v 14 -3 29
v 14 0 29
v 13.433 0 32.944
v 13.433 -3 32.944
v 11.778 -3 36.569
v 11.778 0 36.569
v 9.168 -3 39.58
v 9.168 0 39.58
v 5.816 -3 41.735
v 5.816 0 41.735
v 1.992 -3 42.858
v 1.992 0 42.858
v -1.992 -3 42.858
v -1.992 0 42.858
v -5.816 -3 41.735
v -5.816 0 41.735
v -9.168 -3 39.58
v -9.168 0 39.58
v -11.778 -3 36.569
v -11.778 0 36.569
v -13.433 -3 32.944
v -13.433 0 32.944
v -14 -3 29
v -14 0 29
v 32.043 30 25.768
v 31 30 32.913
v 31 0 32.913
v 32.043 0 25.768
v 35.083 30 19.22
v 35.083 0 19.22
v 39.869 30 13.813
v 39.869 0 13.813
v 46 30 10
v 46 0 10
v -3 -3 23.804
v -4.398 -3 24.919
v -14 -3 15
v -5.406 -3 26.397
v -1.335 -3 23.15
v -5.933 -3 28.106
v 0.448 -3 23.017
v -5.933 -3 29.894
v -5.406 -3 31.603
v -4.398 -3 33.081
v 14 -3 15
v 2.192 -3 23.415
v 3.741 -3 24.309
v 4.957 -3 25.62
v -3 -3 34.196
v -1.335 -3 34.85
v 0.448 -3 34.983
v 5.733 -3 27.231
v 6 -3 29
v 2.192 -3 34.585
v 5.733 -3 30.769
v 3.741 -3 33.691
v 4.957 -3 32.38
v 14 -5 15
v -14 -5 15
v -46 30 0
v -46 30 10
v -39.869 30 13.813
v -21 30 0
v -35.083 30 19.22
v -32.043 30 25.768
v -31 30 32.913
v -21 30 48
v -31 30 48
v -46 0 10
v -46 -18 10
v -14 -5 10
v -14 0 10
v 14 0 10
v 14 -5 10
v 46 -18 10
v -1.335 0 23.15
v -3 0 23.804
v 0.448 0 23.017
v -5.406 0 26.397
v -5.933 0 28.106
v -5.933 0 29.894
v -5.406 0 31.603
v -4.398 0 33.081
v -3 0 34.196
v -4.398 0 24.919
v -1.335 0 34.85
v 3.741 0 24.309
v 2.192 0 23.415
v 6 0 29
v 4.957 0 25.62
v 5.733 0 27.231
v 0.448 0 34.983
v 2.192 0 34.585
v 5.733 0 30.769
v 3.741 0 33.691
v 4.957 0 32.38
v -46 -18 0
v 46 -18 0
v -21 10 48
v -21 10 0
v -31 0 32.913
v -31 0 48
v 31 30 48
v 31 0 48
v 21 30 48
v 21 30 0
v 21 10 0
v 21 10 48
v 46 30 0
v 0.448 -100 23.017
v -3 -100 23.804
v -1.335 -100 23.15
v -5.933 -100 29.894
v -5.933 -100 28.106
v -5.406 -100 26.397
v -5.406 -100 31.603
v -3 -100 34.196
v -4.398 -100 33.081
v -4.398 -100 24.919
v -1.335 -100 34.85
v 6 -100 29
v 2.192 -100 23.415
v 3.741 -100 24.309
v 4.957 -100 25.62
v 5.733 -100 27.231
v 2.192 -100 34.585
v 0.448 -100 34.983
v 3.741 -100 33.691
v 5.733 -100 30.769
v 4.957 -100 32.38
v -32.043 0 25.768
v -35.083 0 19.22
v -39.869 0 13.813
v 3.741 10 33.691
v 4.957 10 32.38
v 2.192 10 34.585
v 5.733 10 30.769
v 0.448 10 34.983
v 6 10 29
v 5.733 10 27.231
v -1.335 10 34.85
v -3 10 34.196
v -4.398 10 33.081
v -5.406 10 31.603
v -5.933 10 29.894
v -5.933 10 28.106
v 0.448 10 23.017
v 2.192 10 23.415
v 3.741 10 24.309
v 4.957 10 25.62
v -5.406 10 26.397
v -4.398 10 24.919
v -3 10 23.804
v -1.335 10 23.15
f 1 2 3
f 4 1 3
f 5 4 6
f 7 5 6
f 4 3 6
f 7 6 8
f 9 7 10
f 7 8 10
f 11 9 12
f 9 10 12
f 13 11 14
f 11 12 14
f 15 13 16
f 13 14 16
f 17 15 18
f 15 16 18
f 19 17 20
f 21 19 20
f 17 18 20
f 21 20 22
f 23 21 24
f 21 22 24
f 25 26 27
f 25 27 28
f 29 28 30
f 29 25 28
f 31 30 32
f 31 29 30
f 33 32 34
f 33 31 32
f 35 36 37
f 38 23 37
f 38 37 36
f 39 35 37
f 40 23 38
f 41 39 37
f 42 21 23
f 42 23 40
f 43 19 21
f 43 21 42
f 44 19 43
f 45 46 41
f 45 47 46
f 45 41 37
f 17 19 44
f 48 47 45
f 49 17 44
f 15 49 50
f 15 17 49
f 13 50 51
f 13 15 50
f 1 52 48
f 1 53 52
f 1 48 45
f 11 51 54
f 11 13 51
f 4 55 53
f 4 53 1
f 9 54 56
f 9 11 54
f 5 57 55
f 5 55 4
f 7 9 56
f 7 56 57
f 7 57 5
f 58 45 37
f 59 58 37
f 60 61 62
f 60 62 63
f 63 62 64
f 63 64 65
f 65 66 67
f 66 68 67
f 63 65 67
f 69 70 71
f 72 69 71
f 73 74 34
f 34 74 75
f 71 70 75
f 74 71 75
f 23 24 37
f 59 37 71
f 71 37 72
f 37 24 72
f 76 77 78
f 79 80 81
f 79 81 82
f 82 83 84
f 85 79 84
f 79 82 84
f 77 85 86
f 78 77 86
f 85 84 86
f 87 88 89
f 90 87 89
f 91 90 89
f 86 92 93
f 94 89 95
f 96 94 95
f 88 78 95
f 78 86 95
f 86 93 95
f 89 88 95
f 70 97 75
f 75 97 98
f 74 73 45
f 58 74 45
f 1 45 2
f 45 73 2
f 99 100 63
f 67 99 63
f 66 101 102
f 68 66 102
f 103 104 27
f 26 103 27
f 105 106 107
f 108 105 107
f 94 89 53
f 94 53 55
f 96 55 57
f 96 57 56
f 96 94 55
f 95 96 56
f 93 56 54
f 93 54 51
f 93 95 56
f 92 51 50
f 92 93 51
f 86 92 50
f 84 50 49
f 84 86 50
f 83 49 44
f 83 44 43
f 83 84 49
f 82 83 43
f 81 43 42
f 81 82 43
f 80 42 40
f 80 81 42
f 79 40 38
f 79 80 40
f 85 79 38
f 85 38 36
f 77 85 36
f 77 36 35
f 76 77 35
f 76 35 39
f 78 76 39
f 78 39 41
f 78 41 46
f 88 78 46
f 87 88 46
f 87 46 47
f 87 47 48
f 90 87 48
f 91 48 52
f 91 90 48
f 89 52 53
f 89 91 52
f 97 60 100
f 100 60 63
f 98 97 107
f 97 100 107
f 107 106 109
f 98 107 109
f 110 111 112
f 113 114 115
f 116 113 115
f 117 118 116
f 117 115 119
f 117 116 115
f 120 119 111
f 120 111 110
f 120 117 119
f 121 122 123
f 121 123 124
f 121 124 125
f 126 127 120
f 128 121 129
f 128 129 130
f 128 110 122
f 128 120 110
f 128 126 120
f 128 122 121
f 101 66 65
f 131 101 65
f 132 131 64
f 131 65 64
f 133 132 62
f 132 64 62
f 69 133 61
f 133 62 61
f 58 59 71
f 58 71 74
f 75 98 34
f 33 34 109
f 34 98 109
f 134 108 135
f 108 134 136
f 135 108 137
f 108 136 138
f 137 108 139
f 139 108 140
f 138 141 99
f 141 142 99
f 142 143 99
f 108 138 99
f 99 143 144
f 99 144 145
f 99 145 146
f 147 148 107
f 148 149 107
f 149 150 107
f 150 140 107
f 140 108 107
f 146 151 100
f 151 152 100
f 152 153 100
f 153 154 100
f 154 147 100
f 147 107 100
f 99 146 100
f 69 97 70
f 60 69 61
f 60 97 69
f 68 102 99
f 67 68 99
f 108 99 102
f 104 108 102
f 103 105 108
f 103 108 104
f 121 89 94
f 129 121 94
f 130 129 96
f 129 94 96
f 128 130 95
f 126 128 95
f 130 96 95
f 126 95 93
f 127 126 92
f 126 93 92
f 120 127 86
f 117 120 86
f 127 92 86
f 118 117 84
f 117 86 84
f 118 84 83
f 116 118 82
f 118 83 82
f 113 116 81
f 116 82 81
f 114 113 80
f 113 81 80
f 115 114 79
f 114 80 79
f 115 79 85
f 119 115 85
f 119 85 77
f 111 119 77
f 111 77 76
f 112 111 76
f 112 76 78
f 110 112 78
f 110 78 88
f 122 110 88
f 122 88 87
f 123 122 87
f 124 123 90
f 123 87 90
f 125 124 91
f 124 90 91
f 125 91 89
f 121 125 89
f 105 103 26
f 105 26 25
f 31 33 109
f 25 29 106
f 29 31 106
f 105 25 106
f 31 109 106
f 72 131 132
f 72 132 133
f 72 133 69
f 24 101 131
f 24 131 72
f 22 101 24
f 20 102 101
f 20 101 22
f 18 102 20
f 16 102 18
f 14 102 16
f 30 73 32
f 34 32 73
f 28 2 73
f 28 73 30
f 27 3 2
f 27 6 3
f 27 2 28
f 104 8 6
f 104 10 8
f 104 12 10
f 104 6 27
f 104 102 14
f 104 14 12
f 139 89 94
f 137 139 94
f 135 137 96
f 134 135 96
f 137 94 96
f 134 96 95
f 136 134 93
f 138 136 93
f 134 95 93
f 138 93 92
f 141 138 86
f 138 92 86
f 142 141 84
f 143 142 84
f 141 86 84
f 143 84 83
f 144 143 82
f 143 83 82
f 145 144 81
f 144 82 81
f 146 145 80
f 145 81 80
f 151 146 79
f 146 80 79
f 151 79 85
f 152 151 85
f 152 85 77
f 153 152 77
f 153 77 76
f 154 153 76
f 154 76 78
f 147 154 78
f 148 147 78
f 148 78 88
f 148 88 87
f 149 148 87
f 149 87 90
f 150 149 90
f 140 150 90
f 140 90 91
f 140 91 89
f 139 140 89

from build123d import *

# Parameters (mm, degrees)
F1_DEPTH    = 48
F0_W        = 92
F0_H        = 18
F2_DEPTH    = 10
F3_W        = 15
F3_H        = 38
F4_DEPTH    = 50
F5_T1_DEPTH = 30
F6_R        = 6
F7_DEPTH    = 3
F8_DEPTH    = 5
F9_DEPTH    = 25
F10_DEPTH   = 100


# Not quite as in the source:
# - a fillet or chamfer that OpenCascade refuses, or shapes differently, is made with other operations: its cross-section is extruded or revolved along the edge and cut away or added


with BuildPart() as f1:
    # F0 (on Top) → F1 (new body)
    with BuildSketch(Plane.XY):
        Polygon((-46, 30), (-46, 0), (46, 0), (46, 30), (21, 30), (21, 10), (-21, 10), (-21, 30), align=None)
    extrude(amount=F1_DEPTH)

    # F0 (on Top) → F2 (join)
    with BuildSketch(Plane.XY):
        with Locations((0, -9)):
            Rectangle(F0_W, F0_H)
    extrude(amount=F2_DEPTH)

    # F3 (on face) → F4 (cut)
    with BuildSketch(Plane.XZ):
        Polygon((-31, 48), (-31, 58.456501329), (-68.4553310275, 62.7410188317), (-62.9399716854, 10), (-46, 10), (-46, 48), align=None)
        with Locations((-38.5, 29)):
            Rectangle(F3_W, F3_H)
        with Locations((38.5, 29)):
            Rectangle(F3_W, F3_H)
        Polygon((31, 58.8478222489), (31, 48), (46, 48), (46, 10), (62.6155510545, 10), (62.6155510545, 62.4165832996), align=None)
    extrude(amount=-F4_DEPTH, mode=Mode.SUBTRACT)

    # F5: fillet of radius 25 on 2 edges, made by hand

    # F5_s2 → F5_t1 (join)
    with BuildSketch(Plane.XZ.offset(-30)):
        with BuildLine():
            ThreePointArc((-31, 32.9128784748), (-35.0834993366, 19.2198145372), (-46, 10))
            Line((-46, 10), (-31, 10))
            Line((-31, 10), (-31, 32.9128784748))
        make_face()
        with BuildLine():
            ThreePointArc((31, 32.9128784748), (35.0834993366, 19.2198145372), (46, 10))
            Line((46, 10), (31, 10))
            Line((31, 10), (31, 32.9128784748))
        make_face()
    extrude(amount=F5_T1_DEPTH)

    # F6 (on face) → F7 (join)
    with BuildSketch(Plane.XZ):
        with BuildLine():
            ThreePointArc((0, 15), (9.8994949366, 19.1005050634), (14, 29))
            ThreePointArc((14, 29), (0, 43), (-14, 29))
            ThreePointArc((-14, 29), (-9.8994949366, 19.1005050634), (0, 15))
        make_face()
        with Locations((0, 29)):
            Circle(F6_R, mode=Mode.SUBTRACT)
        with BuildLine():
            ThreePointArc((0, 15), (-9.8994949366, 19.1005050634), (-14, 29))
            Line((-14, 29), (-14, 15))
            Line((-14, 15), (0, 15))
        make_face()
        with BuildLine():
            Line((14, 15), (14, 29))
            ThreePointArc((14, 29), (9.8994949366, 19.1005050634), (0, 15))
            Line((0, 15), (14, 15))
        make_face()
    extrude(amount=F7_DEPTH)

    # F6 (on face) → F8 (join)
    with BuildSketch(Plane.XZ):
        Polygon((14, 15), (0, 15), (-14, 15), (-14, 10), (14, 10), align=None)
    extrude(amount=F8_DEPTH)

    # F6 (on face) → F9 (cut)
    with BuildSketch(Plane.XZ):
        with Locations((0, 29)):
            Circle(F6_R)
    extrude(amount=-F9_DEPTH, mode=Mode.SUBTRACT)


with BuildPart() as f10:
    # F6 (on face) → F10 (new body)
    with BuildSketch(Plane.XZ):
        with Locations((0, 29)):
            Circle(F6_R)
    extrude(amount=F10_DEPTH)


solid = Compound([f1.part, f10.part])
